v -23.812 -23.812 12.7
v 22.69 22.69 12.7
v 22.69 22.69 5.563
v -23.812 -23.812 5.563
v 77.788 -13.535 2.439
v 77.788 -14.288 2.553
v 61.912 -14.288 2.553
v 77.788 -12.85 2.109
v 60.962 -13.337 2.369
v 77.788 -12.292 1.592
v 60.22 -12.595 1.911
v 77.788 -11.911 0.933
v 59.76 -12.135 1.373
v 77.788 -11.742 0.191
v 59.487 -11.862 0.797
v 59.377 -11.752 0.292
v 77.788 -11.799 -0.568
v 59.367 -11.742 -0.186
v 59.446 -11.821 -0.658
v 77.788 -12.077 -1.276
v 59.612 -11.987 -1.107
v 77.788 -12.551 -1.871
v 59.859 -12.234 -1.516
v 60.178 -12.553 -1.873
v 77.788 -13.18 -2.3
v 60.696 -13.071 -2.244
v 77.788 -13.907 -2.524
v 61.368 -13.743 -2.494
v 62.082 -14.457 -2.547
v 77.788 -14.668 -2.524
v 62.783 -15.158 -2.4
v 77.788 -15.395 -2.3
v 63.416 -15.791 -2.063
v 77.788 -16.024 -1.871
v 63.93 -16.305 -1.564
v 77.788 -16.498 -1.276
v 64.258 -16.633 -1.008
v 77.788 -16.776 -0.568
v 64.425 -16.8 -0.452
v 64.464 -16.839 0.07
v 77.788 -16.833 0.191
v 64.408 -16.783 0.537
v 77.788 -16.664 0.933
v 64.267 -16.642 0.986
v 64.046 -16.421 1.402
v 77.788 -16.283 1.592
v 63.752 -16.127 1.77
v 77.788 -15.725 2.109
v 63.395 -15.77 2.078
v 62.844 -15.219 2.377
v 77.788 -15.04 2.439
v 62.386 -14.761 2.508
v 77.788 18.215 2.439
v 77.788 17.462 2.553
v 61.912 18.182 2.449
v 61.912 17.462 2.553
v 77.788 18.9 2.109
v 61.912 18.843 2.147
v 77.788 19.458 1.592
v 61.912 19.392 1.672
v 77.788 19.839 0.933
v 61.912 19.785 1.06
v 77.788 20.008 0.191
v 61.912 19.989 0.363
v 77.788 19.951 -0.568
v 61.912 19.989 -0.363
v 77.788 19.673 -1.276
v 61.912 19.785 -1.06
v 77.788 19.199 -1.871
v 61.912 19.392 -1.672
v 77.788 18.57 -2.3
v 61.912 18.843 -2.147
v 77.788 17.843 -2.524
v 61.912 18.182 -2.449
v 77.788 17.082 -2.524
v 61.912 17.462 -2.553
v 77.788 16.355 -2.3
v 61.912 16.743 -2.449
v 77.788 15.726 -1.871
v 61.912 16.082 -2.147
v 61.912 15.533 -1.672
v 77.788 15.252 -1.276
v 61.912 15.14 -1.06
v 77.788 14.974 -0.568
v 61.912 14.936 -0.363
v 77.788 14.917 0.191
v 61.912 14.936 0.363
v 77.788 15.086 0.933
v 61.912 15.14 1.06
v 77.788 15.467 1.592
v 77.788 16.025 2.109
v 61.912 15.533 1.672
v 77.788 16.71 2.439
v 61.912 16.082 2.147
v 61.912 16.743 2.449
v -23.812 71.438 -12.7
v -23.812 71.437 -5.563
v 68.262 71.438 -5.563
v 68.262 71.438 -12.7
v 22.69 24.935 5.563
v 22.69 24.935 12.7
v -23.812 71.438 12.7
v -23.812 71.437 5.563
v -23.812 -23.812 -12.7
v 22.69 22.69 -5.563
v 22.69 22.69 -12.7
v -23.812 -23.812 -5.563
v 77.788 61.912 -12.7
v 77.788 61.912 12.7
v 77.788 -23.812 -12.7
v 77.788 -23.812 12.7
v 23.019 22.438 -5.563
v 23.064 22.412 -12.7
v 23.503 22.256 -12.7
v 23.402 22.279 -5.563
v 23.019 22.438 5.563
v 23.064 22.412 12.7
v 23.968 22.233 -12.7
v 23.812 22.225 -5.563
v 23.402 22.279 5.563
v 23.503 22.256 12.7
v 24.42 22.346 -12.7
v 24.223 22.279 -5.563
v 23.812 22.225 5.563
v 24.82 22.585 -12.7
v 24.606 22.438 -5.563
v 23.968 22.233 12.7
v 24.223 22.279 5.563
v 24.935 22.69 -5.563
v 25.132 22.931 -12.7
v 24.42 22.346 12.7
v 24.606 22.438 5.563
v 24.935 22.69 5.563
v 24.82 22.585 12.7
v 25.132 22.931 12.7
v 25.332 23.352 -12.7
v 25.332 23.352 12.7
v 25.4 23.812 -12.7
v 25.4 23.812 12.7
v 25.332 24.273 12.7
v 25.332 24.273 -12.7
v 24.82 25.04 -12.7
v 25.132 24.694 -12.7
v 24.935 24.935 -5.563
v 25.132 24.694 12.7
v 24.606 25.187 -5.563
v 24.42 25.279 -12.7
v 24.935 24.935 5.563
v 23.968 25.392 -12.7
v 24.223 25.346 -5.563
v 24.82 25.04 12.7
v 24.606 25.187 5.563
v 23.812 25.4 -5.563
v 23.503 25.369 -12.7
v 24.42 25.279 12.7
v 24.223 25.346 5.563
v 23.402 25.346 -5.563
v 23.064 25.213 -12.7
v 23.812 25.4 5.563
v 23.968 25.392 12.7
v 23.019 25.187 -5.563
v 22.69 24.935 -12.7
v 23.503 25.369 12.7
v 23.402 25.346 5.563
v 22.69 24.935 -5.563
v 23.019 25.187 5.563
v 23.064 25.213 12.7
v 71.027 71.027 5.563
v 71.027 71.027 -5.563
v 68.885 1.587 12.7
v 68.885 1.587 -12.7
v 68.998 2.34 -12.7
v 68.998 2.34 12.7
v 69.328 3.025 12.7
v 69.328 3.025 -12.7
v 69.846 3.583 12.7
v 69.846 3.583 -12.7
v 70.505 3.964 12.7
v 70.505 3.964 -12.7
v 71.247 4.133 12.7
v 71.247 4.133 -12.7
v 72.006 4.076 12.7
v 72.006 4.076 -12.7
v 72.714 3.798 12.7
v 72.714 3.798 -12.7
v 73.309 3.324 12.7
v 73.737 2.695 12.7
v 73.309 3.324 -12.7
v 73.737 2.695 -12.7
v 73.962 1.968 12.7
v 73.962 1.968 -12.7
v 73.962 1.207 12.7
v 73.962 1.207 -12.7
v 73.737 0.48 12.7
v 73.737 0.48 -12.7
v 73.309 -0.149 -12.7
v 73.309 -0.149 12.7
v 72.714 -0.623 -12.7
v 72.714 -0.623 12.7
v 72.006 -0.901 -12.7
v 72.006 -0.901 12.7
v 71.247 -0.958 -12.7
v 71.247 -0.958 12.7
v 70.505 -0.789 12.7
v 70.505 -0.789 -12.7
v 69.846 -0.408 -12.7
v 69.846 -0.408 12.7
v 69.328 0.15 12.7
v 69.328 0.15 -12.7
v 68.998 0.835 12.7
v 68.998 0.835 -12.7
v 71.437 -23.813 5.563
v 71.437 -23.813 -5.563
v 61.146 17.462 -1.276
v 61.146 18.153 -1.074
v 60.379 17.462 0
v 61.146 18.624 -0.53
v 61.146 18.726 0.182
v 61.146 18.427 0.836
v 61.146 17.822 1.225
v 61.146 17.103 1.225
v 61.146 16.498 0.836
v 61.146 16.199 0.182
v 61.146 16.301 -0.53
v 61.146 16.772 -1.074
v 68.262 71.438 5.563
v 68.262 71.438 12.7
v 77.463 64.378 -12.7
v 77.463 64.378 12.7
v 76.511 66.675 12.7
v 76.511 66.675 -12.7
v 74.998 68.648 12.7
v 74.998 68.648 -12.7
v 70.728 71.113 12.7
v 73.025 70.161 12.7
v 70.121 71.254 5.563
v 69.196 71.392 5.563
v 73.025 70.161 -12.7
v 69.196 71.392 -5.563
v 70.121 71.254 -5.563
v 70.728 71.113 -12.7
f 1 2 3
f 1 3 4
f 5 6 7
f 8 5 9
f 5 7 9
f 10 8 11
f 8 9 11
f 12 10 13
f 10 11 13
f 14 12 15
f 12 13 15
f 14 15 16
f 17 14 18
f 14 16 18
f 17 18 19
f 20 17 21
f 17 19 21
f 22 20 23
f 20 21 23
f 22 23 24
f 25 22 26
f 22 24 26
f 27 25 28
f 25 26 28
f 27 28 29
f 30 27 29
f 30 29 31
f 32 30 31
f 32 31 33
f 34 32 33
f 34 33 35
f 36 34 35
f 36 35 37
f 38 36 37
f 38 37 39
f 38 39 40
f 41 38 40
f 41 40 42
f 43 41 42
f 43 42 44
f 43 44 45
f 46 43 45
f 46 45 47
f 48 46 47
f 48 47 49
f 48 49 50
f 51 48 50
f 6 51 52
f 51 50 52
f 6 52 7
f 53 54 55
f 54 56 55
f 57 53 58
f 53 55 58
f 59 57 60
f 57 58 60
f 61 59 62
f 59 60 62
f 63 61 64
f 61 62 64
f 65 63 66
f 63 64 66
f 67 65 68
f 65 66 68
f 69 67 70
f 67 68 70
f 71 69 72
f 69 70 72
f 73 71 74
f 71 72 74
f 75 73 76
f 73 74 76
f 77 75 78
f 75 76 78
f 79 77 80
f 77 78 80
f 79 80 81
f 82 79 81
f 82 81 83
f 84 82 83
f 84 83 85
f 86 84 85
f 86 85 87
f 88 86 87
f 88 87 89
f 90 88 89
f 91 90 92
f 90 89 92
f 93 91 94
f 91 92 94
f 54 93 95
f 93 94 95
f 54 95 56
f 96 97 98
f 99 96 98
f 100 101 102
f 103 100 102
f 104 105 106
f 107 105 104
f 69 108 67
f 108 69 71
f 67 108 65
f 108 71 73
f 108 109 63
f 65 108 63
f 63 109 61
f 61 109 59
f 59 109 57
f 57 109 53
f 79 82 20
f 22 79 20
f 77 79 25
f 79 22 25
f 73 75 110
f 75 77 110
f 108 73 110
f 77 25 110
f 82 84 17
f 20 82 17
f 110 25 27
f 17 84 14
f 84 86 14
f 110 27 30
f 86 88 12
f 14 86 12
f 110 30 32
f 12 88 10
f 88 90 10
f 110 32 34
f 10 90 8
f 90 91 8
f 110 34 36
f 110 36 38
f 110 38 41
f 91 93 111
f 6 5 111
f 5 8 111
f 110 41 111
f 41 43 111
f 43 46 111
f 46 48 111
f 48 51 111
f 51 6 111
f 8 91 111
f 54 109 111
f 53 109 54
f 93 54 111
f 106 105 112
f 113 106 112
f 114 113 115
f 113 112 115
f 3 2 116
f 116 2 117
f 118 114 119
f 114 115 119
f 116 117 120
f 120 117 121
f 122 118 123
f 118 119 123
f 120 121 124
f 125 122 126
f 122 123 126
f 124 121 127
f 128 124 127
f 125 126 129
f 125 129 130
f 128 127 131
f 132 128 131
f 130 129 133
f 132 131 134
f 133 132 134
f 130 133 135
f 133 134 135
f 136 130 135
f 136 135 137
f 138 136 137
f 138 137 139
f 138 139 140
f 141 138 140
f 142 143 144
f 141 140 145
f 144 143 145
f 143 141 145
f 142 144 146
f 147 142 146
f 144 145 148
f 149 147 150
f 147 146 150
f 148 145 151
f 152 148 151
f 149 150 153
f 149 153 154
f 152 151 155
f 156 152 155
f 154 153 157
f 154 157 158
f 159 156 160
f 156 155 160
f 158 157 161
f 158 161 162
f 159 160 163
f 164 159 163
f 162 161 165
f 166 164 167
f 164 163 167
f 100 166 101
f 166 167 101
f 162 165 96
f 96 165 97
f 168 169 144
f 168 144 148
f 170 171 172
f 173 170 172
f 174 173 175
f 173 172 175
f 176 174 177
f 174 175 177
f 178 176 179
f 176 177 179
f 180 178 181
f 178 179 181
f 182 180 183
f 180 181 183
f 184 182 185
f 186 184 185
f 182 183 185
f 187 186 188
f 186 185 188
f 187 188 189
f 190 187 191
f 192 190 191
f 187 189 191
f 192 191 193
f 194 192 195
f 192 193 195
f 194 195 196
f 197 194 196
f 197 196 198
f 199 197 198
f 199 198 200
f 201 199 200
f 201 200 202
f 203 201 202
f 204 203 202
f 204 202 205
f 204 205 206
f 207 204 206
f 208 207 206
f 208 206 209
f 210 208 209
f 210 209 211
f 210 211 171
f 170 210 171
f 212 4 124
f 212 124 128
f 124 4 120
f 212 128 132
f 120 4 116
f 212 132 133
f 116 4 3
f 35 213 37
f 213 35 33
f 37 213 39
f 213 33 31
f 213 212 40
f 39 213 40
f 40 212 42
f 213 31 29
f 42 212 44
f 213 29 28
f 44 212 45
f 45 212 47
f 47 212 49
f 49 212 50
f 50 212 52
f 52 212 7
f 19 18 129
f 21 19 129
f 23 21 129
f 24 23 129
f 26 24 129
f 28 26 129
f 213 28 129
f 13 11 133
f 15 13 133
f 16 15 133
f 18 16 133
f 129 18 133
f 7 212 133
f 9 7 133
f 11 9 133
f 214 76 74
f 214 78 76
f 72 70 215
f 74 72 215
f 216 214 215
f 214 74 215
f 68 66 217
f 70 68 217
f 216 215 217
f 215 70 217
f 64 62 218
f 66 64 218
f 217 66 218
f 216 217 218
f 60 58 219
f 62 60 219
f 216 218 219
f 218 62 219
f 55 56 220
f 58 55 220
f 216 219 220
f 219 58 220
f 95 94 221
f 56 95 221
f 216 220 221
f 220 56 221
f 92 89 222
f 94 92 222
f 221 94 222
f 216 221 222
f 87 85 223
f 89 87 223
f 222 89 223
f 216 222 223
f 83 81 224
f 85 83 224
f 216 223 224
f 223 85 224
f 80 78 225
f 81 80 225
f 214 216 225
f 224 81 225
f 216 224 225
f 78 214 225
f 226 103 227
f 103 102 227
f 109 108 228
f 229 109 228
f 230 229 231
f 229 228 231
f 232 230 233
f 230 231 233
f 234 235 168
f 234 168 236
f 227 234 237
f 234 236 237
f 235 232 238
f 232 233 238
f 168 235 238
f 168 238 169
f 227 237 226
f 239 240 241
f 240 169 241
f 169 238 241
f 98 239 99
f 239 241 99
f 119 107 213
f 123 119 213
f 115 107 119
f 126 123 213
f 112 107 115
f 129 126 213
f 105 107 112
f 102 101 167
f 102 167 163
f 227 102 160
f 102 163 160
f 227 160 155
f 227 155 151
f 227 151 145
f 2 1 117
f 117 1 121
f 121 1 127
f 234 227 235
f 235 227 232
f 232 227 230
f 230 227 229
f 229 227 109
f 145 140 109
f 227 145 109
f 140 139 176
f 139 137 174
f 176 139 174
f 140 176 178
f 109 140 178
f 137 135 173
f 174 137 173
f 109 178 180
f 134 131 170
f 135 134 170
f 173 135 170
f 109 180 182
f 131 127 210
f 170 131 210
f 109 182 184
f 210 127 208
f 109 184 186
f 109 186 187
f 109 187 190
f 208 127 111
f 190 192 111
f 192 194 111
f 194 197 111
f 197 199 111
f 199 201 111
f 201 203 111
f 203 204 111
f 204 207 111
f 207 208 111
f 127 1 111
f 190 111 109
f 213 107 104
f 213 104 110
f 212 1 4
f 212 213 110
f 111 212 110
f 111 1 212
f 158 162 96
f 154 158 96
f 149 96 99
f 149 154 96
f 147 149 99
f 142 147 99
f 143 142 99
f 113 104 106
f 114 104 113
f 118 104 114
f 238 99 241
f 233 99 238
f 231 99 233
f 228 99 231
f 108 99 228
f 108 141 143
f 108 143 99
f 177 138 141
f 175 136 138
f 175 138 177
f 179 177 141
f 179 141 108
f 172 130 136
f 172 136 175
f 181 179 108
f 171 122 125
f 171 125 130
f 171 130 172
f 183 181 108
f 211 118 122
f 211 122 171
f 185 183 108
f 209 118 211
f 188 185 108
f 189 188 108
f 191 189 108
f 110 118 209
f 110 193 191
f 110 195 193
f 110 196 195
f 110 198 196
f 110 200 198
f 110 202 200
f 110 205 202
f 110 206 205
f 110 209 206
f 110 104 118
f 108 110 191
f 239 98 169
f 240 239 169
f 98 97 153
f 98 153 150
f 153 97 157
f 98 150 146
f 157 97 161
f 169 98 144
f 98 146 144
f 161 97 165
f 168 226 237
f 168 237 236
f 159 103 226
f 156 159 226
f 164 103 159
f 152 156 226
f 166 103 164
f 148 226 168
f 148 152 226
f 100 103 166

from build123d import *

# Parameters (mm, degrees)
BOSS_EXTRUDE1_DEPTH         = 12.7
SKETCH2_W                   = 11.1252
SKETCH2_H                   = 67.351920908
CUT_EXTRUDE1_DEPTH          = 83.336020747
FILLET1_R                   = 9.525
SKETCH3_R                   = 1.5875
CUT_EXTRUDE2_DEPTH          = 109.624912255
F_1_4_20_TAPPED_HOLE1_D     = 5.1054
F_1_4_20_TAPPED_HOLE2_D     = 5.1054
F_1_4_20_TAPPED_HOLE2_DEPTH = 15.875
F_1_4_20_TAPPED_HOLE2_TIP   = 1.533816902
F_1_4_20_TAPPED_HOLE3_D     = 5.1054


with BuildPart() as part:
    # Sketch1 → Boss-Extrude1 (new, symmetric)
    with BuildSketch(Plane.XY):
        Polygon((-23.8125, -23.8125), (77.7875, -23.8125), (77.7875, 23.8125), (23.8125, 23.8125), align=None)
    boss_extrude1 = extrude(amount=BOSS_EXTRUDE1_DEPTH, both=True)

    # Sketch2 → Cut-Extrude1 (cut, through all)
    with BuildSketch(Plane(origin=(0, 0, 0), x_dir=(0, 0, 1), z_dir=(-0.7071067811865441, 0.707106781186551, 0))):
        Rectangle(SKETCH2_W, SKETCH2_H)
    cut_extrude1 = extrude(amount=-CUT_EXTRUDE1_DEPTH, mode=Mode.SUBTRACT)

    # Mirror1: Boss-Extrude1, Cut-Extrude1 across plane
    add(boss_extrude1.mirror(Plane(origin=(77.7875, 23.8125, 12.7), x_dir=(0, 0, 1), z_dir=(0, -1, 0))))
    add(cut_extrude1.mirror(Plane(origin=(77.7875, 23.8125, 12.7), x_dir=(0, 0, 1), z_dir=(0, -1, 0))), mode=Mode.SUBTRACT)

    # Fillet1
    # the kernel refuses this fillet: 9.525 mm, written as the material it takes off along each edge
    with BuildSketch(Plane(origin=(77.7875, 71.4375, -36.5125), x_dir=(0, -1, 0), z_dir=(0, 0, 1))) as fillet1_piece_1:
        with BuildLine():
            CenterArc((FILLET1_R, -FILLET1_R), FILLET1_R, 90, 90)
            Line((0, -FILLET1_R), (0, 0))
            Line((0, 0), (FILLET1_R, 0))
        make_face()
    extrude(amount=73.025, mode=Mode.SUBTRACT)

    # Sketch3 → Cut-Extrude2 (cut, through all)
    with BuildSketch(Plane.XY.offset(12.7)):
        with Locations((23.8125, 23.8125)):
            Circle(SKETCH3_R)
    extrude(amount=-CUT_EXTRUDE2_DEPTH, mode=Mode.SUBTRACT)

    # 1/4-20 Tapped Hole1 (through all)
    with Locations(Plane.XY.offset(12.7)):
        with Locations((71.4375, 1.5875)):
            Hole(F_1_4_20_TAPPED_HOLE1_D / 2)

    # 1/4-20 Tapped Hole2
    with Locations(Plane(origin=(77.7875, 0, 0), x_dir=(0, 0, -1), z_dir=(1, 0, 0))):
        with Locations((0, 17.4625)):
            Hole(F_1_4_20_TAPPED_HOLE2_D / 2, depth=F_1_4_20_TAPPED_HOLE2_DEPTH)
            with Locations((0, 0, -(F_1_4_20_TAPPED_HOLE2_DEPTH + F_1_4_20_TAPPED_HOLE2_TIP / 2))):  # 118° drill point
                Cone(0, F_1_4_20_TAPPED_HOLE2_D / 2, F_1_4_20_TAPPED_HOLE2_TIP, mode=Mode.SUBTRACT)

    # 1/4-20 Tapped Hole3 (through all)
    with Locations(Plane(origin=(77.7875, 0, 0), x_dir=(0, 0, -1), z_dir=(1, 0, 0))):
        with Locations((0, -14.2875)):
            Hole(F_1_4_20_TAPPED_HOLE3_D / 2)


solid = part.part
